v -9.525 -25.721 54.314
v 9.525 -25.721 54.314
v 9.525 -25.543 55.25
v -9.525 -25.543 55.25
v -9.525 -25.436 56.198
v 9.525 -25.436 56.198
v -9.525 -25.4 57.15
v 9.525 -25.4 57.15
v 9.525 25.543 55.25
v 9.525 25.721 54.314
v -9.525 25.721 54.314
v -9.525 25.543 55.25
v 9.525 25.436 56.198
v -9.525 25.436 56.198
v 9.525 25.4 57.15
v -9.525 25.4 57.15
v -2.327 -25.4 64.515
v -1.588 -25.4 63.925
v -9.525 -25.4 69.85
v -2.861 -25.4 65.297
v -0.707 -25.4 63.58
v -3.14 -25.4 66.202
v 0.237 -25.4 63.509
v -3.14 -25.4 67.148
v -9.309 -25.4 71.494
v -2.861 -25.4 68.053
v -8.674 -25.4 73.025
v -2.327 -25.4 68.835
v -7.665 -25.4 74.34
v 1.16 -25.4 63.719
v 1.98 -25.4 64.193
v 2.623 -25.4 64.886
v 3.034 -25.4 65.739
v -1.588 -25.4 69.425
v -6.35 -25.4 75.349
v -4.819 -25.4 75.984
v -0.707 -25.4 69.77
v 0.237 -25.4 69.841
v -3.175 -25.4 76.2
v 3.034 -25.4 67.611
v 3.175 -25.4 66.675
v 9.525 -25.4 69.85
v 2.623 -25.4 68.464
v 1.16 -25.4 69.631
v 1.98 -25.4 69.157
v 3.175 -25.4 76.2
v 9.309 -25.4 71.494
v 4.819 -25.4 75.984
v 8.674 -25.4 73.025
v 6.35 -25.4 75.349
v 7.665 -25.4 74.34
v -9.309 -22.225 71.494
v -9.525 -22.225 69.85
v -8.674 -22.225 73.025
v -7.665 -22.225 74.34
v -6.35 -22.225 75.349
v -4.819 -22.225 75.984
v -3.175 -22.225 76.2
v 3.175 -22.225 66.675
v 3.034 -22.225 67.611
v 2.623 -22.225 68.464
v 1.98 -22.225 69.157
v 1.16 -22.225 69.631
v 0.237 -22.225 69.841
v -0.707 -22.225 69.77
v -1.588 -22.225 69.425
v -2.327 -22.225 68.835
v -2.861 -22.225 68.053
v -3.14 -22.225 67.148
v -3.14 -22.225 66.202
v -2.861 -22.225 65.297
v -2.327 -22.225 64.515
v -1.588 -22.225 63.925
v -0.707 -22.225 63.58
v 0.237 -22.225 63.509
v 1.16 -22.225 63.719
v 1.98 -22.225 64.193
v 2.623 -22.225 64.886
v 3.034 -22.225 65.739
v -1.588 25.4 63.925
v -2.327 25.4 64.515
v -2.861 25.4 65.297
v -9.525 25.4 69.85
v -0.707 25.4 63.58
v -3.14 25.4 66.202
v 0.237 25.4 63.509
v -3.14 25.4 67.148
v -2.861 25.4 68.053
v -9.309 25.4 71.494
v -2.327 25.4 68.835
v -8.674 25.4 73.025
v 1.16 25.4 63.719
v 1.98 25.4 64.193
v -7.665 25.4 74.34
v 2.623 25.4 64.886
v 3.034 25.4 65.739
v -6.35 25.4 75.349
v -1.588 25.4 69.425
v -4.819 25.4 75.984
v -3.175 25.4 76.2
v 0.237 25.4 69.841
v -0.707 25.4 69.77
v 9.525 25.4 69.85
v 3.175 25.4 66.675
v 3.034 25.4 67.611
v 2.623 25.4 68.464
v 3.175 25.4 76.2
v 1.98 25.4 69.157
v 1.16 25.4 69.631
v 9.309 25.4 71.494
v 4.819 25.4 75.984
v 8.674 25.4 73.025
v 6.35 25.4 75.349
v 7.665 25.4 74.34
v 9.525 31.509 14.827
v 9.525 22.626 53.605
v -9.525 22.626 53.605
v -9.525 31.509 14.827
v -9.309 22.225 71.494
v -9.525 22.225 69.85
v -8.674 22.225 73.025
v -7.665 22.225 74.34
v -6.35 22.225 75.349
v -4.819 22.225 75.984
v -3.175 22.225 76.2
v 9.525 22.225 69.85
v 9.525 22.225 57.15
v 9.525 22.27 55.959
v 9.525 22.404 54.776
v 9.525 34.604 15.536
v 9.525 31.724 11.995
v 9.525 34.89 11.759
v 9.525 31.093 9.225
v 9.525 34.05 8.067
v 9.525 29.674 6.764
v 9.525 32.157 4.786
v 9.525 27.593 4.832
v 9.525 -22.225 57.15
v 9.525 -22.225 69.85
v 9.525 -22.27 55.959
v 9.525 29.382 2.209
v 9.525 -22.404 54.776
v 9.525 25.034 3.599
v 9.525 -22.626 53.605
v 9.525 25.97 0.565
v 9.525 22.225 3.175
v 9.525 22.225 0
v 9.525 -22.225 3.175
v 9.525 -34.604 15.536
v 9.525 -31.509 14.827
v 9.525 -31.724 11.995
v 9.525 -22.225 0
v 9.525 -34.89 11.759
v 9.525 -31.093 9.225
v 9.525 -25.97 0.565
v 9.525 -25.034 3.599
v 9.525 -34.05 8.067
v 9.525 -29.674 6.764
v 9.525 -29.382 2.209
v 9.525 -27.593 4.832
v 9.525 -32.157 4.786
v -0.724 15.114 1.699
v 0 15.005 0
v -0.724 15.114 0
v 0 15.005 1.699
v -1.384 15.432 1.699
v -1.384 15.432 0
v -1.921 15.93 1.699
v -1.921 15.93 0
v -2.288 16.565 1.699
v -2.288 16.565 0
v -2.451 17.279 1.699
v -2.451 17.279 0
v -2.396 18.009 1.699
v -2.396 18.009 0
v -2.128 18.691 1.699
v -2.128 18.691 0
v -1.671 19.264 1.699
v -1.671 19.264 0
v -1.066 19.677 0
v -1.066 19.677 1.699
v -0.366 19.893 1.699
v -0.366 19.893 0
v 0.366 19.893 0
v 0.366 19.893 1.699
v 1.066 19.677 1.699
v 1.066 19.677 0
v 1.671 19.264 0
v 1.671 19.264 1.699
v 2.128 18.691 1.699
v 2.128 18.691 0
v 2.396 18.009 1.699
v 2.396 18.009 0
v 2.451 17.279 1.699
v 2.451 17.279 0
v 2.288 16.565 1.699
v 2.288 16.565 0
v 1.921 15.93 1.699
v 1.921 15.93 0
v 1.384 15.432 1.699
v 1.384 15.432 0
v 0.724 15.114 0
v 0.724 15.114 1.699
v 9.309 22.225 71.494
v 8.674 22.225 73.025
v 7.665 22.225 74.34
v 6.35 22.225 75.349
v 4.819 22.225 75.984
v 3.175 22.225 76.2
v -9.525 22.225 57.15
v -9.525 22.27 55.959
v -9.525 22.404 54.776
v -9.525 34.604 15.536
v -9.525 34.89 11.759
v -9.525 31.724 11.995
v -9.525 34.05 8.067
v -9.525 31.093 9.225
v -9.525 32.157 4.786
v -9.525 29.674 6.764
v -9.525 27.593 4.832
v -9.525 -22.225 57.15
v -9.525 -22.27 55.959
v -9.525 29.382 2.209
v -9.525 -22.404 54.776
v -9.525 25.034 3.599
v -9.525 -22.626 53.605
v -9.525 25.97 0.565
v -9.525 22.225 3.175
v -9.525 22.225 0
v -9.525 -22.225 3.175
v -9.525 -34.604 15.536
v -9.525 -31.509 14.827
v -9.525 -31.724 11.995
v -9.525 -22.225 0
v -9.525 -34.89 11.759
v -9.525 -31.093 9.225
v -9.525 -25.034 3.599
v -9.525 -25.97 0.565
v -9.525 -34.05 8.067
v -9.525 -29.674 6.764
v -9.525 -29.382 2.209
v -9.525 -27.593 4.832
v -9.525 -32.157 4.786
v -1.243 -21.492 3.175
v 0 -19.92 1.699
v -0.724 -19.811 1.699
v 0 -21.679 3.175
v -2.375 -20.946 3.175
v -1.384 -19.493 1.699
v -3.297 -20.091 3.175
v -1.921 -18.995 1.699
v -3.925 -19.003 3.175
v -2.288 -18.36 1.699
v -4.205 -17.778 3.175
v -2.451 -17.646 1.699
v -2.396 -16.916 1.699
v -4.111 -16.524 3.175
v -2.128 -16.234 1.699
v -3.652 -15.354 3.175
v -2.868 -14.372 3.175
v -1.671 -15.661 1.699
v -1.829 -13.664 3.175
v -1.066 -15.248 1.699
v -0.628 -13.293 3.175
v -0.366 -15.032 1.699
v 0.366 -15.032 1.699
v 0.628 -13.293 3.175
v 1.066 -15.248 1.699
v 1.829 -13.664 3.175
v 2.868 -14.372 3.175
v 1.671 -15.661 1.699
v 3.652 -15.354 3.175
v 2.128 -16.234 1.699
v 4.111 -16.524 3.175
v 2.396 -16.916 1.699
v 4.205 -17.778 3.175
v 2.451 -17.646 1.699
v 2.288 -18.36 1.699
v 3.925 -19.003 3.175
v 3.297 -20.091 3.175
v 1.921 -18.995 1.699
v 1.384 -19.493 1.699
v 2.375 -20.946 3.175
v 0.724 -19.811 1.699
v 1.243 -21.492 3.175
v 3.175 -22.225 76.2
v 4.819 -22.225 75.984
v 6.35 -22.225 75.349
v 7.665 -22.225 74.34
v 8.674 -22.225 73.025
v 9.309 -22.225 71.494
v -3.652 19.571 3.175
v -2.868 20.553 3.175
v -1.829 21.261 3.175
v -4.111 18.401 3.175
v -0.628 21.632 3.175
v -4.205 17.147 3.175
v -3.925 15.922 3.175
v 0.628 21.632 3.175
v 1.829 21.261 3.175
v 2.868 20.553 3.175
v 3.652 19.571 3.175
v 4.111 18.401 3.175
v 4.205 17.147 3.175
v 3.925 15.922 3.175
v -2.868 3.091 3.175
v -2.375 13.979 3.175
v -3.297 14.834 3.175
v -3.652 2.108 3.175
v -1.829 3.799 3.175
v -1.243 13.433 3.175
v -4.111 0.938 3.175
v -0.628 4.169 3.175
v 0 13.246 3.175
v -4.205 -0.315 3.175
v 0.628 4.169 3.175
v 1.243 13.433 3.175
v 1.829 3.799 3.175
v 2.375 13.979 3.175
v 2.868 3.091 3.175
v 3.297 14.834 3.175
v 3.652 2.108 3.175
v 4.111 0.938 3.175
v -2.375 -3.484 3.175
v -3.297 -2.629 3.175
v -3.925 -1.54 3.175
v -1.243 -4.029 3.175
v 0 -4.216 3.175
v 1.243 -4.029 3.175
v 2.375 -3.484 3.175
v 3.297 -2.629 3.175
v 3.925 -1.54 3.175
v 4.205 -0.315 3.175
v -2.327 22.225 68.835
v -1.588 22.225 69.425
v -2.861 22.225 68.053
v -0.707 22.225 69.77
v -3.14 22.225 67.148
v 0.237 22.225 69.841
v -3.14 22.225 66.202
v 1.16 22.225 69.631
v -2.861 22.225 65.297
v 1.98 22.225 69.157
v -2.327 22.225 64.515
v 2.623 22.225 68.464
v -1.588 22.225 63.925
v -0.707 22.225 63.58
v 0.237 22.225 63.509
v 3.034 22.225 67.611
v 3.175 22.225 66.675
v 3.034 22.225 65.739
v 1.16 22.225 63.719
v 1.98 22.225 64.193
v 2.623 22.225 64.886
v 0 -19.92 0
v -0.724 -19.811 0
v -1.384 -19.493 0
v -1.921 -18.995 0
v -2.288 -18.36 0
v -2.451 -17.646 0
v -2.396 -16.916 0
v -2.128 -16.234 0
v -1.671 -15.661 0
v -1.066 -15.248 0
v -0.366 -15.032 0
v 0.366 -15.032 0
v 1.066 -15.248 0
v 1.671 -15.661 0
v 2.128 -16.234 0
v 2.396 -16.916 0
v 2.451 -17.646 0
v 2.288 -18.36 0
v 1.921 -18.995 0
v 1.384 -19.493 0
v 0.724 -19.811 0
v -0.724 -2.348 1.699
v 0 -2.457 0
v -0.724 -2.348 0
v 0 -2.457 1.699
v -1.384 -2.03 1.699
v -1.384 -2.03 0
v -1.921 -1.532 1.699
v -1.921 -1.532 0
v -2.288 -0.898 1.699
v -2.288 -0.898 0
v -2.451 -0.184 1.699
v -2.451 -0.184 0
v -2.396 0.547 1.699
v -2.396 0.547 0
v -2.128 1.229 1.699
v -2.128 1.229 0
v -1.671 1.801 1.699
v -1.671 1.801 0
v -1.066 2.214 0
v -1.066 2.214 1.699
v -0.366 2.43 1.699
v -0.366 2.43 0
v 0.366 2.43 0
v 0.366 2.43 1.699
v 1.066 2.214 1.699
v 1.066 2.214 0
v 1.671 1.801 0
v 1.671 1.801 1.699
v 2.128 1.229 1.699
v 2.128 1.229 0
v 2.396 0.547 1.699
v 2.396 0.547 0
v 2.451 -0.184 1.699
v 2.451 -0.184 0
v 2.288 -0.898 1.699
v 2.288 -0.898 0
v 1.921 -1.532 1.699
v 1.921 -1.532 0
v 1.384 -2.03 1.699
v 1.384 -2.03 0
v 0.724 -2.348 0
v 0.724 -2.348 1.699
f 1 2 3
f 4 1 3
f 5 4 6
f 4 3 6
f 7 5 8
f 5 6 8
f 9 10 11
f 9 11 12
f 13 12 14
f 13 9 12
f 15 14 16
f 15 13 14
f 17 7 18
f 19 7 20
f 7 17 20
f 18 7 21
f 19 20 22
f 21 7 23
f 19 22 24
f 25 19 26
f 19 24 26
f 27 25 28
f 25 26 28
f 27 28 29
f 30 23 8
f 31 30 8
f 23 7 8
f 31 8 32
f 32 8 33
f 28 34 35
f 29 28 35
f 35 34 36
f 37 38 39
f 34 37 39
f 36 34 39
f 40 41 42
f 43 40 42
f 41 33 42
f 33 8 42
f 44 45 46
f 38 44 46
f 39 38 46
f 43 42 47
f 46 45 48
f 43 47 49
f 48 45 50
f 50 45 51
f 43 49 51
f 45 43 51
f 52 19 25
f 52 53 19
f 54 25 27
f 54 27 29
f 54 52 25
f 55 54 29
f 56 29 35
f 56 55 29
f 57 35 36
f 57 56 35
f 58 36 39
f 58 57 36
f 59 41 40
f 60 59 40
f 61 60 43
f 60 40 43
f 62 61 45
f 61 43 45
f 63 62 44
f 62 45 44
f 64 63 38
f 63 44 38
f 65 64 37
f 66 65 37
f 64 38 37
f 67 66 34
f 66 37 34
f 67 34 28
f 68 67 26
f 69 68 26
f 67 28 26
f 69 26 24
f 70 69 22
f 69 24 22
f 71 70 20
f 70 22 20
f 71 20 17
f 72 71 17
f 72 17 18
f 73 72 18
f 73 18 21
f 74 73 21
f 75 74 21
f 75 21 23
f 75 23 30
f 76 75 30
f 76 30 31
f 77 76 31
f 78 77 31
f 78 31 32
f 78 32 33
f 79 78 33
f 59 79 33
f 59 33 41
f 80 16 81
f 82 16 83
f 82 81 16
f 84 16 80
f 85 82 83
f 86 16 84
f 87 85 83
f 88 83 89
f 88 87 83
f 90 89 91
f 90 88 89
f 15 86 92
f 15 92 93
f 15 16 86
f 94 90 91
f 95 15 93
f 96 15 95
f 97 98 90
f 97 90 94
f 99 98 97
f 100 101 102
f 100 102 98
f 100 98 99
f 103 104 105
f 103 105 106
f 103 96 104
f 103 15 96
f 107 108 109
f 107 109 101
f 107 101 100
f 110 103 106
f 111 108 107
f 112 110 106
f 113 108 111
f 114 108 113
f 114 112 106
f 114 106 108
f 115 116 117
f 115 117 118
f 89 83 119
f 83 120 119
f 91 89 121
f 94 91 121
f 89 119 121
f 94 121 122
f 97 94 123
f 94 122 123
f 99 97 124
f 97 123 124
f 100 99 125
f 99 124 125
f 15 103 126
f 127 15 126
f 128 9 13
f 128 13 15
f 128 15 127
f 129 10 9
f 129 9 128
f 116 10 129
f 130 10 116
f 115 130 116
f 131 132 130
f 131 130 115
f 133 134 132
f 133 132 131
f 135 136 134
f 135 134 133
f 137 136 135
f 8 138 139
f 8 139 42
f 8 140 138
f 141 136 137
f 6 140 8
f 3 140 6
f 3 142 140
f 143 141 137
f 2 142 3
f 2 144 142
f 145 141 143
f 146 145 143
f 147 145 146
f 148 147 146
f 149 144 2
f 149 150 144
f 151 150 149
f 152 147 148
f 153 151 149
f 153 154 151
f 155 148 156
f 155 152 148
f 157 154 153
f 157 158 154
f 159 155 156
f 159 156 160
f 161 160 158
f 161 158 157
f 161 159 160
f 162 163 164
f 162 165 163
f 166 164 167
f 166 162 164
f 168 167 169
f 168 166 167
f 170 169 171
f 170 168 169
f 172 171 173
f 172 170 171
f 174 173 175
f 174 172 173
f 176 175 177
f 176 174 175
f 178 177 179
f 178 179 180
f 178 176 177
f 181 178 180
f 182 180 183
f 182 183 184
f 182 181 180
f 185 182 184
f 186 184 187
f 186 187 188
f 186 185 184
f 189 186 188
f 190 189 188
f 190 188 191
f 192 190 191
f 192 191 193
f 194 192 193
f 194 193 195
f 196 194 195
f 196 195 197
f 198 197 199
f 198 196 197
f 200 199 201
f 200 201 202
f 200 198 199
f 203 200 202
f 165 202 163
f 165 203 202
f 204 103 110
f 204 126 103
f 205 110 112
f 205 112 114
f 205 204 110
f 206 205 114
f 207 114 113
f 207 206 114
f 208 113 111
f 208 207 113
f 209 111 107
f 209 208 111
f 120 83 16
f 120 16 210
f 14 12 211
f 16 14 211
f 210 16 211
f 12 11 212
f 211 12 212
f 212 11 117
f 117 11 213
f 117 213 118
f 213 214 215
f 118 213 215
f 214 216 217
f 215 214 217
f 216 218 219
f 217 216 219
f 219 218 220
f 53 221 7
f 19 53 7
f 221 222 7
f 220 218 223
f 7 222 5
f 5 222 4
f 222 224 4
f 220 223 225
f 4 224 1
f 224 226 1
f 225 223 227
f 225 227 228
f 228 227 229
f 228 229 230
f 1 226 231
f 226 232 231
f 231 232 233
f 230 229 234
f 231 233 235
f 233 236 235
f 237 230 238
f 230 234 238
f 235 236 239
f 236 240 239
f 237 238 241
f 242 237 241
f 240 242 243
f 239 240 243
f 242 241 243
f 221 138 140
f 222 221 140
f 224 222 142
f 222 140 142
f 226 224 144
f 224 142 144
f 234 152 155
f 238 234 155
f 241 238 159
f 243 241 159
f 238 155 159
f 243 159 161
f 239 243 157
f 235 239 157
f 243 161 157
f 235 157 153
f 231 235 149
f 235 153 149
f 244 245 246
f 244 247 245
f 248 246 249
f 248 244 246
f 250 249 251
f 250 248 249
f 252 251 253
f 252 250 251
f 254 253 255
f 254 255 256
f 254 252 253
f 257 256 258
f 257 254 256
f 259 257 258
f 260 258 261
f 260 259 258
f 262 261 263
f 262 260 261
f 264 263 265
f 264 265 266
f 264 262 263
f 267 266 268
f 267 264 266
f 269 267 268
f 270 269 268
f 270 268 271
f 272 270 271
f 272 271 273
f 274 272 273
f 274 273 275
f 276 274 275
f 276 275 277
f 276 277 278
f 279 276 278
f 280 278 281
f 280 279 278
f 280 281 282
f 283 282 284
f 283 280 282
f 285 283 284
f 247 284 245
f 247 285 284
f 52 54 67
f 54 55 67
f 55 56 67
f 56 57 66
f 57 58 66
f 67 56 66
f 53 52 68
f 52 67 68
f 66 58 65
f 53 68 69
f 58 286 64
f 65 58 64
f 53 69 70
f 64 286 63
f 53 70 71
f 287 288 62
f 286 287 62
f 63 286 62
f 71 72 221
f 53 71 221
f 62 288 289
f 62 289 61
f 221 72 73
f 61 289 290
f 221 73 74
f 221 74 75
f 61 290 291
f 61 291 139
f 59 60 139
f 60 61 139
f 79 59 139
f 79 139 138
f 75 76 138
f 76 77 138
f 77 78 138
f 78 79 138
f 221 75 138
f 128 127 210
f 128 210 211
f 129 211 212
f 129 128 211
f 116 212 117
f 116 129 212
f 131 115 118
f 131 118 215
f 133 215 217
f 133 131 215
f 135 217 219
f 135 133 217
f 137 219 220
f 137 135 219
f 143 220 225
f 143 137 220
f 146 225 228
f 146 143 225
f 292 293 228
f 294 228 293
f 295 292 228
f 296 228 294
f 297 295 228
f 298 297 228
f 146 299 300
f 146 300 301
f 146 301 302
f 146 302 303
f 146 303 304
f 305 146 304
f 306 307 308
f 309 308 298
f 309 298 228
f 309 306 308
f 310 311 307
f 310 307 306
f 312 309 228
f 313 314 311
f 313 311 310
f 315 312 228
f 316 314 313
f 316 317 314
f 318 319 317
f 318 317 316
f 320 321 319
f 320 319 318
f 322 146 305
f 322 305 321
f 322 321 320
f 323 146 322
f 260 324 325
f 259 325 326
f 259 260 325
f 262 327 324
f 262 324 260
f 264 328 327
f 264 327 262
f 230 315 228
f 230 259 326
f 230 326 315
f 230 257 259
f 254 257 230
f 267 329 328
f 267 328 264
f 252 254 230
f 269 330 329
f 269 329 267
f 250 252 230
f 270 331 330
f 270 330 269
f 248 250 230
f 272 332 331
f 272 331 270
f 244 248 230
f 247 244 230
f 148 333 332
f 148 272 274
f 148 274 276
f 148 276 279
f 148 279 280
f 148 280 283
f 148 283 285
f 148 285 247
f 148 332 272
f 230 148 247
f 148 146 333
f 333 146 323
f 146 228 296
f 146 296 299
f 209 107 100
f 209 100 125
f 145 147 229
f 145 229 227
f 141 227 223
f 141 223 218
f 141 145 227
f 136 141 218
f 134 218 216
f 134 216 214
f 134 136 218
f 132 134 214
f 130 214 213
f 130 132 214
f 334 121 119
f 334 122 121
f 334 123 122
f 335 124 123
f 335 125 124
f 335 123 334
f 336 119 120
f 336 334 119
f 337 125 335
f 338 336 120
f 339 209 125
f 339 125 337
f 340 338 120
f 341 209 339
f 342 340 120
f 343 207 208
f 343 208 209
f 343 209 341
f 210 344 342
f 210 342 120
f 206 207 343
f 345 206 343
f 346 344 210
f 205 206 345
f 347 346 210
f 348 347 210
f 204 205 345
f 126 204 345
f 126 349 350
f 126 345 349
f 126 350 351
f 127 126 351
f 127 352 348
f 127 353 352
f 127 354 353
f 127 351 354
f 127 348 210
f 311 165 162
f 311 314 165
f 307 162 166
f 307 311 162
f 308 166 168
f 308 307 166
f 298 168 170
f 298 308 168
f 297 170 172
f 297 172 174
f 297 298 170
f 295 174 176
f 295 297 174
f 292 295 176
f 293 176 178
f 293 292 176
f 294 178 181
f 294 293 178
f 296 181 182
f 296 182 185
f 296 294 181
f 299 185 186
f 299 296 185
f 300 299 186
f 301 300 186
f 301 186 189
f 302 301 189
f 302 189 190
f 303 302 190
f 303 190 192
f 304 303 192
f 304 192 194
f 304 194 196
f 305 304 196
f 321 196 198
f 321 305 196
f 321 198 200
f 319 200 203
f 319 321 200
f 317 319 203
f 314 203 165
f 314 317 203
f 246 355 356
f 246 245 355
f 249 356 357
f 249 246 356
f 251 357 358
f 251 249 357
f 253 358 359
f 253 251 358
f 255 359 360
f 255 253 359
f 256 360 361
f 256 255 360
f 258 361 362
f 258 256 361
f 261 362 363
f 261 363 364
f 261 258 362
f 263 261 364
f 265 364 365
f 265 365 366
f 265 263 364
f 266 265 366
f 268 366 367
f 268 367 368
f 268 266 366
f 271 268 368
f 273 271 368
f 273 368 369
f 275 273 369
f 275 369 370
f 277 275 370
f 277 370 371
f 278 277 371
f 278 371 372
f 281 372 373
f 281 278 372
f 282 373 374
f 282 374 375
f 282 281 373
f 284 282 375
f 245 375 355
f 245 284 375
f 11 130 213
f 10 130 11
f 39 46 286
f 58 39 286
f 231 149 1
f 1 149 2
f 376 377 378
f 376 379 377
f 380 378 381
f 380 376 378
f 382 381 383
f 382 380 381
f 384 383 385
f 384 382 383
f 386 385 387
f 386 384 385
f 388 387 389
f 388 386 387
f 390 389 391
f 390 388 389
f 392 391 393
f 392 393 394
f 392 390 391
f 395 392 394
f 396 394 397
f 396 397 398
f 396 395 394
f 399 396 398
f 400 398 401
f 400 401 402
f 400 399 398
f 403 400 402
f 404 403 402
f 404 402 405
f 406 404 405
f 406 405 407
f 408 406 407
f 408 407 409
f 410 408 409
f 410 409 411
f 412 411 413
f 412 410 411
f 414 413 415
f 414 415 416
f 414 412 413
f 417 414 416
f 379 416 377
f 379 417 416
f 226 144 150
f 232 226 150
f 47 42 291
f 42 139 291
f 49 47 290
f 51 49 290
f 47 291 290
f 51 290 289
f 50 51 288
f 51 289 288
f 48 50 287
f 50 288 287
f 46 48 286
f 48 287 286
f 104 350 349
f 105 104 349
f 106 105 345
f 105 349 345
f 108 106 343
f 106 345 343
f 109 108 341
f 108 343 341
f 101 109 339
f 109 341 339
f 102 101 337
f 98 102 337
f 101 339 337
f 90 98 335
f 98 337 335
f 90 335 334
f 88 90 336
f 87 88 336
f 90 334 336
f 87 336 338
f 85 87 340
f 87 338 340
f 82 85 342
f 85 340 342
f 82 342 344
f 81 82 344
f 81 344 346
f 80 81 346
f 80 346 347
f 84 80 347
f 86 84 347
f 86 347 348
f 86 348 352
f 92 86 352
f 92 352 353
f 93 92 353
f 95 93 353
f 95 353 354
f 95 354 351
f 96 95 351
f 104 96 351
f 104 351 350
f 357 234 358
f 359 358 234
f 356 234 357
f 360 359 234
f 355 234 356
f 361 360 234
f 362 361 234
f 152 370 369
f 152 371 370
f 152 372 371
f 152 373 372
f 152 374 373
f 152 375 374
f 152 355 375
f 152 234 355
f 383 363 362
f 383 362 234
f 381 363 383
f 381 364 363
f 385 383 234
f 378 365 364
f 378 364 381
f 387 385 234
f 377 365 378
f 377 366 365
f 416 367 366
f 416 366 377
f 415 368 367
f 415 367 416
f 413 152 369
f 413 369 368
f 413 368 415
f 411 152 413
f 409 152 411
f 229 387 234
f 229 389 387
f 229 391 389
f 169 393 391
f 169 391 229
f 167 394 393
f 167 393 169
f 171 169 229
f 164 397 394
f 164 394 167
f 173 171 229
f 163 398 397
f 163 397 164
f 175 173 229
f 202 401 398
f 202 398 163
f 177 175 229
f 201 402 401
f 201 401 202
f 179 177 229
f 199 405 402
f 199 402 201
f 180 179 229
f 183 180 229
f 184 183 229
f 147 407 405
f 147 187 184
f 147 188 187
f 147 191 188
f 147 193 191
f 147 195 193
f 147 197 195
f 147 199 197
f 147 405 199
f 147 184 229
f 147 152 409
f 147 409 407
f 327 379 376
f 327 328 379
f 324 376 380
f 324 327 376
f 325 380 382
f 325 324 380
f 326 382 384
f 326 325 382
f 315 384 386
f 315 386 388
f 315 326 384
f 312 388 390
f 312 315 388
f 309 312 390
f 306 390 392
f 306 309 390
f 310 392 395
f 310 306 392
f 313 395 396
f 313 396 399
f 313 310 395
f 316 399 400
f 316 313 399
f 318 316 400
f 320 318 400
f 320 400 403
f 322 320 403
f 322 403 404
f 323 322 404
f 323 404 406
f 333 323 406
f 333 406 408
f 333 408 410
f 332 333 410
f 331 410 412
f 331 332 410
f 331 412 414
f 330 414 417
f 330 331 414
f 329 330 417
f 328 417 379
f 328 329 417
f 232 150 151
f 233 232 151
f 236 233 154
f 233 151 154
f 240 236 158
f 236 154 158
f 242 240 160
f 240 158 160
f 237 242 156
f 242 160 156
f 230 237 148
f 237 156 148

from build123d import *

# Parameters (mm, degrees)
EXTRUDE_THIN1_DEPTH                       = 9.525
SKETCH4_R                                 = 3.175
CUT_EXTRUDE1_DEPTH                        = 61.325
CSK_FOR_8_FLAT_HEAD_MACHINE_SCREW_2_COUNT = 2
CSK_FOR_8_FLAT_HEAD_MACHINE_SCREW_2_PITCH = 17.4625
CSK_FOR_8_FLAT_HEAD_MACHINE_SCREW_3_COUNT = 2
CSK_FOR_8_FLAT_HEAD_MACHINE_SCREW_3_PITCH = 34.925
FILLET1_R                                 = 6.35


with BuildPart() as part:
    # Sketch2 → Extrude-Thin1 (new body, symmetric)
    with BuildSketch(Plane(origin=(0, 0, 66.675), x_dir=(0, -1, 0), z_dir=(1, 0, 0))):
        with BuildLine():
            Line((22.225, 66.675), (-22.225, 66.675))
            ThreePointArc((-22.225, 66.675), (-32.15743925, 61.88933197), (-34.604310473, 51.139039455))
            Line((-34.604310473, 51.139039455), (-25.720689527, 12.360960545))
            ThreePointArc((-25.720689527, 12.360960545), (-25.480427048, 10.952017343), (-25.4, 9.525))
            Line((-25.4, 9.525), (-25.4, -9.525))
            Line((-25.4, -9.525), (-22.225, -9.525))
            Line((-22.225, -9.525), (-22.225, 9.525))
            ThreePointArc((-22.225, 9.525), (-22.325533809, 11.308771679), (-22.625861909, 13.069950682))
            Line((-22.625861909, 13.069950682), (-31.509482855, 51.848029591))
            ThreePointArc((-31.509482855, 51.848029591), (-29.674329438, 59.910748978), (-22.225, 63.5))
            Line((-22.225, 63.5), (22.225, 63.5))
            Line((22.225, 63.5), (22.225, 66.675))
        make_face()
    extrude_thin1 = extrude(amount=EXTRUDE_THIN1_DEPTH, both=True)

    # Mirror1: Extrude-Thin1 across plane
    add(extrude_thin1.mirror(Plane.ZX))

    # Sketch4 → Cut-Extrude1 (cut, through all)
    with BuildSketch(Plane.XZ.offset(25.4)):
        with Locations((0, 66.675)):
            Circle(SKETCH4_R)
    extrude(amount=-CUT_EXTRUDE1_DEPTH, mode=Mode.SUBTRACT)

    # Sketch6 → CSK for #8 Flat Head Machine Screw (100)1 (revolve, cut)
    with BuildSketch(Plane(origin=(0, -17.4625, 3.175), x_dir=(0, -1, 0), z_dir=(1, 0, 0))):
        Polygon((0, 0), (0, 3.175), (2.45745, 3.175), (2.45745, 1.475934296), (4.2164, 0), align=None)
    csk_for_8_flat_head_machine_screw_100 = revolve(axis=Axis((0, -17.4625, 9.525), (0, 0, -1)), mode=Mode.SUBTRACT)

    # CSK for _8 Flat Head Machine Screw _ 2: CSK for #8 Flat Head Machine Screw (100)1 ×2
    with Locations(*[(0, i * CSK_FOR_8_FLAT_HEAD_MACHINE_SCREW_2_PITCH, 0) for i in range(1, CSK_FOR_8_FLAT_HEAD_MACHINE_SCREW_2_COUNT)]):
        add(csk_for_8_flat_head_machine_screw_100, mode=Mode.SUBTRACT)

    # CSK for _8 Flat Head Machine Screw _ 3: CSK for #8 Flat Head Machine Screw (100)1 ×2
    with Locations(*[(0, i * CSK_FOR_8_FLAT_HEAD_MACHINE_SCREW_3_PITCH, 0) for i in range(1, CSK_FOR_8_FLAT_HEAD_MACHINE_SCREW_3_COUNT)]):
        add(csk_for_8_flat_head_machine_screw_100, mode=Mode.SUBTRACT)

    # Fillet1
    fillet1_edges = [part.edges().sort_by_distance(p)[0] for p in [
        (-9.525, 23.8125, 76.2),
        (9.525, -23.8125, 76.2),
        (-9.525, -23.8125, 76.2),
        (9.525, 23.8125, 76.2),
    ]]
    fillet(fillet1_edges, radius=FILLET1_R)


solid = part.part
